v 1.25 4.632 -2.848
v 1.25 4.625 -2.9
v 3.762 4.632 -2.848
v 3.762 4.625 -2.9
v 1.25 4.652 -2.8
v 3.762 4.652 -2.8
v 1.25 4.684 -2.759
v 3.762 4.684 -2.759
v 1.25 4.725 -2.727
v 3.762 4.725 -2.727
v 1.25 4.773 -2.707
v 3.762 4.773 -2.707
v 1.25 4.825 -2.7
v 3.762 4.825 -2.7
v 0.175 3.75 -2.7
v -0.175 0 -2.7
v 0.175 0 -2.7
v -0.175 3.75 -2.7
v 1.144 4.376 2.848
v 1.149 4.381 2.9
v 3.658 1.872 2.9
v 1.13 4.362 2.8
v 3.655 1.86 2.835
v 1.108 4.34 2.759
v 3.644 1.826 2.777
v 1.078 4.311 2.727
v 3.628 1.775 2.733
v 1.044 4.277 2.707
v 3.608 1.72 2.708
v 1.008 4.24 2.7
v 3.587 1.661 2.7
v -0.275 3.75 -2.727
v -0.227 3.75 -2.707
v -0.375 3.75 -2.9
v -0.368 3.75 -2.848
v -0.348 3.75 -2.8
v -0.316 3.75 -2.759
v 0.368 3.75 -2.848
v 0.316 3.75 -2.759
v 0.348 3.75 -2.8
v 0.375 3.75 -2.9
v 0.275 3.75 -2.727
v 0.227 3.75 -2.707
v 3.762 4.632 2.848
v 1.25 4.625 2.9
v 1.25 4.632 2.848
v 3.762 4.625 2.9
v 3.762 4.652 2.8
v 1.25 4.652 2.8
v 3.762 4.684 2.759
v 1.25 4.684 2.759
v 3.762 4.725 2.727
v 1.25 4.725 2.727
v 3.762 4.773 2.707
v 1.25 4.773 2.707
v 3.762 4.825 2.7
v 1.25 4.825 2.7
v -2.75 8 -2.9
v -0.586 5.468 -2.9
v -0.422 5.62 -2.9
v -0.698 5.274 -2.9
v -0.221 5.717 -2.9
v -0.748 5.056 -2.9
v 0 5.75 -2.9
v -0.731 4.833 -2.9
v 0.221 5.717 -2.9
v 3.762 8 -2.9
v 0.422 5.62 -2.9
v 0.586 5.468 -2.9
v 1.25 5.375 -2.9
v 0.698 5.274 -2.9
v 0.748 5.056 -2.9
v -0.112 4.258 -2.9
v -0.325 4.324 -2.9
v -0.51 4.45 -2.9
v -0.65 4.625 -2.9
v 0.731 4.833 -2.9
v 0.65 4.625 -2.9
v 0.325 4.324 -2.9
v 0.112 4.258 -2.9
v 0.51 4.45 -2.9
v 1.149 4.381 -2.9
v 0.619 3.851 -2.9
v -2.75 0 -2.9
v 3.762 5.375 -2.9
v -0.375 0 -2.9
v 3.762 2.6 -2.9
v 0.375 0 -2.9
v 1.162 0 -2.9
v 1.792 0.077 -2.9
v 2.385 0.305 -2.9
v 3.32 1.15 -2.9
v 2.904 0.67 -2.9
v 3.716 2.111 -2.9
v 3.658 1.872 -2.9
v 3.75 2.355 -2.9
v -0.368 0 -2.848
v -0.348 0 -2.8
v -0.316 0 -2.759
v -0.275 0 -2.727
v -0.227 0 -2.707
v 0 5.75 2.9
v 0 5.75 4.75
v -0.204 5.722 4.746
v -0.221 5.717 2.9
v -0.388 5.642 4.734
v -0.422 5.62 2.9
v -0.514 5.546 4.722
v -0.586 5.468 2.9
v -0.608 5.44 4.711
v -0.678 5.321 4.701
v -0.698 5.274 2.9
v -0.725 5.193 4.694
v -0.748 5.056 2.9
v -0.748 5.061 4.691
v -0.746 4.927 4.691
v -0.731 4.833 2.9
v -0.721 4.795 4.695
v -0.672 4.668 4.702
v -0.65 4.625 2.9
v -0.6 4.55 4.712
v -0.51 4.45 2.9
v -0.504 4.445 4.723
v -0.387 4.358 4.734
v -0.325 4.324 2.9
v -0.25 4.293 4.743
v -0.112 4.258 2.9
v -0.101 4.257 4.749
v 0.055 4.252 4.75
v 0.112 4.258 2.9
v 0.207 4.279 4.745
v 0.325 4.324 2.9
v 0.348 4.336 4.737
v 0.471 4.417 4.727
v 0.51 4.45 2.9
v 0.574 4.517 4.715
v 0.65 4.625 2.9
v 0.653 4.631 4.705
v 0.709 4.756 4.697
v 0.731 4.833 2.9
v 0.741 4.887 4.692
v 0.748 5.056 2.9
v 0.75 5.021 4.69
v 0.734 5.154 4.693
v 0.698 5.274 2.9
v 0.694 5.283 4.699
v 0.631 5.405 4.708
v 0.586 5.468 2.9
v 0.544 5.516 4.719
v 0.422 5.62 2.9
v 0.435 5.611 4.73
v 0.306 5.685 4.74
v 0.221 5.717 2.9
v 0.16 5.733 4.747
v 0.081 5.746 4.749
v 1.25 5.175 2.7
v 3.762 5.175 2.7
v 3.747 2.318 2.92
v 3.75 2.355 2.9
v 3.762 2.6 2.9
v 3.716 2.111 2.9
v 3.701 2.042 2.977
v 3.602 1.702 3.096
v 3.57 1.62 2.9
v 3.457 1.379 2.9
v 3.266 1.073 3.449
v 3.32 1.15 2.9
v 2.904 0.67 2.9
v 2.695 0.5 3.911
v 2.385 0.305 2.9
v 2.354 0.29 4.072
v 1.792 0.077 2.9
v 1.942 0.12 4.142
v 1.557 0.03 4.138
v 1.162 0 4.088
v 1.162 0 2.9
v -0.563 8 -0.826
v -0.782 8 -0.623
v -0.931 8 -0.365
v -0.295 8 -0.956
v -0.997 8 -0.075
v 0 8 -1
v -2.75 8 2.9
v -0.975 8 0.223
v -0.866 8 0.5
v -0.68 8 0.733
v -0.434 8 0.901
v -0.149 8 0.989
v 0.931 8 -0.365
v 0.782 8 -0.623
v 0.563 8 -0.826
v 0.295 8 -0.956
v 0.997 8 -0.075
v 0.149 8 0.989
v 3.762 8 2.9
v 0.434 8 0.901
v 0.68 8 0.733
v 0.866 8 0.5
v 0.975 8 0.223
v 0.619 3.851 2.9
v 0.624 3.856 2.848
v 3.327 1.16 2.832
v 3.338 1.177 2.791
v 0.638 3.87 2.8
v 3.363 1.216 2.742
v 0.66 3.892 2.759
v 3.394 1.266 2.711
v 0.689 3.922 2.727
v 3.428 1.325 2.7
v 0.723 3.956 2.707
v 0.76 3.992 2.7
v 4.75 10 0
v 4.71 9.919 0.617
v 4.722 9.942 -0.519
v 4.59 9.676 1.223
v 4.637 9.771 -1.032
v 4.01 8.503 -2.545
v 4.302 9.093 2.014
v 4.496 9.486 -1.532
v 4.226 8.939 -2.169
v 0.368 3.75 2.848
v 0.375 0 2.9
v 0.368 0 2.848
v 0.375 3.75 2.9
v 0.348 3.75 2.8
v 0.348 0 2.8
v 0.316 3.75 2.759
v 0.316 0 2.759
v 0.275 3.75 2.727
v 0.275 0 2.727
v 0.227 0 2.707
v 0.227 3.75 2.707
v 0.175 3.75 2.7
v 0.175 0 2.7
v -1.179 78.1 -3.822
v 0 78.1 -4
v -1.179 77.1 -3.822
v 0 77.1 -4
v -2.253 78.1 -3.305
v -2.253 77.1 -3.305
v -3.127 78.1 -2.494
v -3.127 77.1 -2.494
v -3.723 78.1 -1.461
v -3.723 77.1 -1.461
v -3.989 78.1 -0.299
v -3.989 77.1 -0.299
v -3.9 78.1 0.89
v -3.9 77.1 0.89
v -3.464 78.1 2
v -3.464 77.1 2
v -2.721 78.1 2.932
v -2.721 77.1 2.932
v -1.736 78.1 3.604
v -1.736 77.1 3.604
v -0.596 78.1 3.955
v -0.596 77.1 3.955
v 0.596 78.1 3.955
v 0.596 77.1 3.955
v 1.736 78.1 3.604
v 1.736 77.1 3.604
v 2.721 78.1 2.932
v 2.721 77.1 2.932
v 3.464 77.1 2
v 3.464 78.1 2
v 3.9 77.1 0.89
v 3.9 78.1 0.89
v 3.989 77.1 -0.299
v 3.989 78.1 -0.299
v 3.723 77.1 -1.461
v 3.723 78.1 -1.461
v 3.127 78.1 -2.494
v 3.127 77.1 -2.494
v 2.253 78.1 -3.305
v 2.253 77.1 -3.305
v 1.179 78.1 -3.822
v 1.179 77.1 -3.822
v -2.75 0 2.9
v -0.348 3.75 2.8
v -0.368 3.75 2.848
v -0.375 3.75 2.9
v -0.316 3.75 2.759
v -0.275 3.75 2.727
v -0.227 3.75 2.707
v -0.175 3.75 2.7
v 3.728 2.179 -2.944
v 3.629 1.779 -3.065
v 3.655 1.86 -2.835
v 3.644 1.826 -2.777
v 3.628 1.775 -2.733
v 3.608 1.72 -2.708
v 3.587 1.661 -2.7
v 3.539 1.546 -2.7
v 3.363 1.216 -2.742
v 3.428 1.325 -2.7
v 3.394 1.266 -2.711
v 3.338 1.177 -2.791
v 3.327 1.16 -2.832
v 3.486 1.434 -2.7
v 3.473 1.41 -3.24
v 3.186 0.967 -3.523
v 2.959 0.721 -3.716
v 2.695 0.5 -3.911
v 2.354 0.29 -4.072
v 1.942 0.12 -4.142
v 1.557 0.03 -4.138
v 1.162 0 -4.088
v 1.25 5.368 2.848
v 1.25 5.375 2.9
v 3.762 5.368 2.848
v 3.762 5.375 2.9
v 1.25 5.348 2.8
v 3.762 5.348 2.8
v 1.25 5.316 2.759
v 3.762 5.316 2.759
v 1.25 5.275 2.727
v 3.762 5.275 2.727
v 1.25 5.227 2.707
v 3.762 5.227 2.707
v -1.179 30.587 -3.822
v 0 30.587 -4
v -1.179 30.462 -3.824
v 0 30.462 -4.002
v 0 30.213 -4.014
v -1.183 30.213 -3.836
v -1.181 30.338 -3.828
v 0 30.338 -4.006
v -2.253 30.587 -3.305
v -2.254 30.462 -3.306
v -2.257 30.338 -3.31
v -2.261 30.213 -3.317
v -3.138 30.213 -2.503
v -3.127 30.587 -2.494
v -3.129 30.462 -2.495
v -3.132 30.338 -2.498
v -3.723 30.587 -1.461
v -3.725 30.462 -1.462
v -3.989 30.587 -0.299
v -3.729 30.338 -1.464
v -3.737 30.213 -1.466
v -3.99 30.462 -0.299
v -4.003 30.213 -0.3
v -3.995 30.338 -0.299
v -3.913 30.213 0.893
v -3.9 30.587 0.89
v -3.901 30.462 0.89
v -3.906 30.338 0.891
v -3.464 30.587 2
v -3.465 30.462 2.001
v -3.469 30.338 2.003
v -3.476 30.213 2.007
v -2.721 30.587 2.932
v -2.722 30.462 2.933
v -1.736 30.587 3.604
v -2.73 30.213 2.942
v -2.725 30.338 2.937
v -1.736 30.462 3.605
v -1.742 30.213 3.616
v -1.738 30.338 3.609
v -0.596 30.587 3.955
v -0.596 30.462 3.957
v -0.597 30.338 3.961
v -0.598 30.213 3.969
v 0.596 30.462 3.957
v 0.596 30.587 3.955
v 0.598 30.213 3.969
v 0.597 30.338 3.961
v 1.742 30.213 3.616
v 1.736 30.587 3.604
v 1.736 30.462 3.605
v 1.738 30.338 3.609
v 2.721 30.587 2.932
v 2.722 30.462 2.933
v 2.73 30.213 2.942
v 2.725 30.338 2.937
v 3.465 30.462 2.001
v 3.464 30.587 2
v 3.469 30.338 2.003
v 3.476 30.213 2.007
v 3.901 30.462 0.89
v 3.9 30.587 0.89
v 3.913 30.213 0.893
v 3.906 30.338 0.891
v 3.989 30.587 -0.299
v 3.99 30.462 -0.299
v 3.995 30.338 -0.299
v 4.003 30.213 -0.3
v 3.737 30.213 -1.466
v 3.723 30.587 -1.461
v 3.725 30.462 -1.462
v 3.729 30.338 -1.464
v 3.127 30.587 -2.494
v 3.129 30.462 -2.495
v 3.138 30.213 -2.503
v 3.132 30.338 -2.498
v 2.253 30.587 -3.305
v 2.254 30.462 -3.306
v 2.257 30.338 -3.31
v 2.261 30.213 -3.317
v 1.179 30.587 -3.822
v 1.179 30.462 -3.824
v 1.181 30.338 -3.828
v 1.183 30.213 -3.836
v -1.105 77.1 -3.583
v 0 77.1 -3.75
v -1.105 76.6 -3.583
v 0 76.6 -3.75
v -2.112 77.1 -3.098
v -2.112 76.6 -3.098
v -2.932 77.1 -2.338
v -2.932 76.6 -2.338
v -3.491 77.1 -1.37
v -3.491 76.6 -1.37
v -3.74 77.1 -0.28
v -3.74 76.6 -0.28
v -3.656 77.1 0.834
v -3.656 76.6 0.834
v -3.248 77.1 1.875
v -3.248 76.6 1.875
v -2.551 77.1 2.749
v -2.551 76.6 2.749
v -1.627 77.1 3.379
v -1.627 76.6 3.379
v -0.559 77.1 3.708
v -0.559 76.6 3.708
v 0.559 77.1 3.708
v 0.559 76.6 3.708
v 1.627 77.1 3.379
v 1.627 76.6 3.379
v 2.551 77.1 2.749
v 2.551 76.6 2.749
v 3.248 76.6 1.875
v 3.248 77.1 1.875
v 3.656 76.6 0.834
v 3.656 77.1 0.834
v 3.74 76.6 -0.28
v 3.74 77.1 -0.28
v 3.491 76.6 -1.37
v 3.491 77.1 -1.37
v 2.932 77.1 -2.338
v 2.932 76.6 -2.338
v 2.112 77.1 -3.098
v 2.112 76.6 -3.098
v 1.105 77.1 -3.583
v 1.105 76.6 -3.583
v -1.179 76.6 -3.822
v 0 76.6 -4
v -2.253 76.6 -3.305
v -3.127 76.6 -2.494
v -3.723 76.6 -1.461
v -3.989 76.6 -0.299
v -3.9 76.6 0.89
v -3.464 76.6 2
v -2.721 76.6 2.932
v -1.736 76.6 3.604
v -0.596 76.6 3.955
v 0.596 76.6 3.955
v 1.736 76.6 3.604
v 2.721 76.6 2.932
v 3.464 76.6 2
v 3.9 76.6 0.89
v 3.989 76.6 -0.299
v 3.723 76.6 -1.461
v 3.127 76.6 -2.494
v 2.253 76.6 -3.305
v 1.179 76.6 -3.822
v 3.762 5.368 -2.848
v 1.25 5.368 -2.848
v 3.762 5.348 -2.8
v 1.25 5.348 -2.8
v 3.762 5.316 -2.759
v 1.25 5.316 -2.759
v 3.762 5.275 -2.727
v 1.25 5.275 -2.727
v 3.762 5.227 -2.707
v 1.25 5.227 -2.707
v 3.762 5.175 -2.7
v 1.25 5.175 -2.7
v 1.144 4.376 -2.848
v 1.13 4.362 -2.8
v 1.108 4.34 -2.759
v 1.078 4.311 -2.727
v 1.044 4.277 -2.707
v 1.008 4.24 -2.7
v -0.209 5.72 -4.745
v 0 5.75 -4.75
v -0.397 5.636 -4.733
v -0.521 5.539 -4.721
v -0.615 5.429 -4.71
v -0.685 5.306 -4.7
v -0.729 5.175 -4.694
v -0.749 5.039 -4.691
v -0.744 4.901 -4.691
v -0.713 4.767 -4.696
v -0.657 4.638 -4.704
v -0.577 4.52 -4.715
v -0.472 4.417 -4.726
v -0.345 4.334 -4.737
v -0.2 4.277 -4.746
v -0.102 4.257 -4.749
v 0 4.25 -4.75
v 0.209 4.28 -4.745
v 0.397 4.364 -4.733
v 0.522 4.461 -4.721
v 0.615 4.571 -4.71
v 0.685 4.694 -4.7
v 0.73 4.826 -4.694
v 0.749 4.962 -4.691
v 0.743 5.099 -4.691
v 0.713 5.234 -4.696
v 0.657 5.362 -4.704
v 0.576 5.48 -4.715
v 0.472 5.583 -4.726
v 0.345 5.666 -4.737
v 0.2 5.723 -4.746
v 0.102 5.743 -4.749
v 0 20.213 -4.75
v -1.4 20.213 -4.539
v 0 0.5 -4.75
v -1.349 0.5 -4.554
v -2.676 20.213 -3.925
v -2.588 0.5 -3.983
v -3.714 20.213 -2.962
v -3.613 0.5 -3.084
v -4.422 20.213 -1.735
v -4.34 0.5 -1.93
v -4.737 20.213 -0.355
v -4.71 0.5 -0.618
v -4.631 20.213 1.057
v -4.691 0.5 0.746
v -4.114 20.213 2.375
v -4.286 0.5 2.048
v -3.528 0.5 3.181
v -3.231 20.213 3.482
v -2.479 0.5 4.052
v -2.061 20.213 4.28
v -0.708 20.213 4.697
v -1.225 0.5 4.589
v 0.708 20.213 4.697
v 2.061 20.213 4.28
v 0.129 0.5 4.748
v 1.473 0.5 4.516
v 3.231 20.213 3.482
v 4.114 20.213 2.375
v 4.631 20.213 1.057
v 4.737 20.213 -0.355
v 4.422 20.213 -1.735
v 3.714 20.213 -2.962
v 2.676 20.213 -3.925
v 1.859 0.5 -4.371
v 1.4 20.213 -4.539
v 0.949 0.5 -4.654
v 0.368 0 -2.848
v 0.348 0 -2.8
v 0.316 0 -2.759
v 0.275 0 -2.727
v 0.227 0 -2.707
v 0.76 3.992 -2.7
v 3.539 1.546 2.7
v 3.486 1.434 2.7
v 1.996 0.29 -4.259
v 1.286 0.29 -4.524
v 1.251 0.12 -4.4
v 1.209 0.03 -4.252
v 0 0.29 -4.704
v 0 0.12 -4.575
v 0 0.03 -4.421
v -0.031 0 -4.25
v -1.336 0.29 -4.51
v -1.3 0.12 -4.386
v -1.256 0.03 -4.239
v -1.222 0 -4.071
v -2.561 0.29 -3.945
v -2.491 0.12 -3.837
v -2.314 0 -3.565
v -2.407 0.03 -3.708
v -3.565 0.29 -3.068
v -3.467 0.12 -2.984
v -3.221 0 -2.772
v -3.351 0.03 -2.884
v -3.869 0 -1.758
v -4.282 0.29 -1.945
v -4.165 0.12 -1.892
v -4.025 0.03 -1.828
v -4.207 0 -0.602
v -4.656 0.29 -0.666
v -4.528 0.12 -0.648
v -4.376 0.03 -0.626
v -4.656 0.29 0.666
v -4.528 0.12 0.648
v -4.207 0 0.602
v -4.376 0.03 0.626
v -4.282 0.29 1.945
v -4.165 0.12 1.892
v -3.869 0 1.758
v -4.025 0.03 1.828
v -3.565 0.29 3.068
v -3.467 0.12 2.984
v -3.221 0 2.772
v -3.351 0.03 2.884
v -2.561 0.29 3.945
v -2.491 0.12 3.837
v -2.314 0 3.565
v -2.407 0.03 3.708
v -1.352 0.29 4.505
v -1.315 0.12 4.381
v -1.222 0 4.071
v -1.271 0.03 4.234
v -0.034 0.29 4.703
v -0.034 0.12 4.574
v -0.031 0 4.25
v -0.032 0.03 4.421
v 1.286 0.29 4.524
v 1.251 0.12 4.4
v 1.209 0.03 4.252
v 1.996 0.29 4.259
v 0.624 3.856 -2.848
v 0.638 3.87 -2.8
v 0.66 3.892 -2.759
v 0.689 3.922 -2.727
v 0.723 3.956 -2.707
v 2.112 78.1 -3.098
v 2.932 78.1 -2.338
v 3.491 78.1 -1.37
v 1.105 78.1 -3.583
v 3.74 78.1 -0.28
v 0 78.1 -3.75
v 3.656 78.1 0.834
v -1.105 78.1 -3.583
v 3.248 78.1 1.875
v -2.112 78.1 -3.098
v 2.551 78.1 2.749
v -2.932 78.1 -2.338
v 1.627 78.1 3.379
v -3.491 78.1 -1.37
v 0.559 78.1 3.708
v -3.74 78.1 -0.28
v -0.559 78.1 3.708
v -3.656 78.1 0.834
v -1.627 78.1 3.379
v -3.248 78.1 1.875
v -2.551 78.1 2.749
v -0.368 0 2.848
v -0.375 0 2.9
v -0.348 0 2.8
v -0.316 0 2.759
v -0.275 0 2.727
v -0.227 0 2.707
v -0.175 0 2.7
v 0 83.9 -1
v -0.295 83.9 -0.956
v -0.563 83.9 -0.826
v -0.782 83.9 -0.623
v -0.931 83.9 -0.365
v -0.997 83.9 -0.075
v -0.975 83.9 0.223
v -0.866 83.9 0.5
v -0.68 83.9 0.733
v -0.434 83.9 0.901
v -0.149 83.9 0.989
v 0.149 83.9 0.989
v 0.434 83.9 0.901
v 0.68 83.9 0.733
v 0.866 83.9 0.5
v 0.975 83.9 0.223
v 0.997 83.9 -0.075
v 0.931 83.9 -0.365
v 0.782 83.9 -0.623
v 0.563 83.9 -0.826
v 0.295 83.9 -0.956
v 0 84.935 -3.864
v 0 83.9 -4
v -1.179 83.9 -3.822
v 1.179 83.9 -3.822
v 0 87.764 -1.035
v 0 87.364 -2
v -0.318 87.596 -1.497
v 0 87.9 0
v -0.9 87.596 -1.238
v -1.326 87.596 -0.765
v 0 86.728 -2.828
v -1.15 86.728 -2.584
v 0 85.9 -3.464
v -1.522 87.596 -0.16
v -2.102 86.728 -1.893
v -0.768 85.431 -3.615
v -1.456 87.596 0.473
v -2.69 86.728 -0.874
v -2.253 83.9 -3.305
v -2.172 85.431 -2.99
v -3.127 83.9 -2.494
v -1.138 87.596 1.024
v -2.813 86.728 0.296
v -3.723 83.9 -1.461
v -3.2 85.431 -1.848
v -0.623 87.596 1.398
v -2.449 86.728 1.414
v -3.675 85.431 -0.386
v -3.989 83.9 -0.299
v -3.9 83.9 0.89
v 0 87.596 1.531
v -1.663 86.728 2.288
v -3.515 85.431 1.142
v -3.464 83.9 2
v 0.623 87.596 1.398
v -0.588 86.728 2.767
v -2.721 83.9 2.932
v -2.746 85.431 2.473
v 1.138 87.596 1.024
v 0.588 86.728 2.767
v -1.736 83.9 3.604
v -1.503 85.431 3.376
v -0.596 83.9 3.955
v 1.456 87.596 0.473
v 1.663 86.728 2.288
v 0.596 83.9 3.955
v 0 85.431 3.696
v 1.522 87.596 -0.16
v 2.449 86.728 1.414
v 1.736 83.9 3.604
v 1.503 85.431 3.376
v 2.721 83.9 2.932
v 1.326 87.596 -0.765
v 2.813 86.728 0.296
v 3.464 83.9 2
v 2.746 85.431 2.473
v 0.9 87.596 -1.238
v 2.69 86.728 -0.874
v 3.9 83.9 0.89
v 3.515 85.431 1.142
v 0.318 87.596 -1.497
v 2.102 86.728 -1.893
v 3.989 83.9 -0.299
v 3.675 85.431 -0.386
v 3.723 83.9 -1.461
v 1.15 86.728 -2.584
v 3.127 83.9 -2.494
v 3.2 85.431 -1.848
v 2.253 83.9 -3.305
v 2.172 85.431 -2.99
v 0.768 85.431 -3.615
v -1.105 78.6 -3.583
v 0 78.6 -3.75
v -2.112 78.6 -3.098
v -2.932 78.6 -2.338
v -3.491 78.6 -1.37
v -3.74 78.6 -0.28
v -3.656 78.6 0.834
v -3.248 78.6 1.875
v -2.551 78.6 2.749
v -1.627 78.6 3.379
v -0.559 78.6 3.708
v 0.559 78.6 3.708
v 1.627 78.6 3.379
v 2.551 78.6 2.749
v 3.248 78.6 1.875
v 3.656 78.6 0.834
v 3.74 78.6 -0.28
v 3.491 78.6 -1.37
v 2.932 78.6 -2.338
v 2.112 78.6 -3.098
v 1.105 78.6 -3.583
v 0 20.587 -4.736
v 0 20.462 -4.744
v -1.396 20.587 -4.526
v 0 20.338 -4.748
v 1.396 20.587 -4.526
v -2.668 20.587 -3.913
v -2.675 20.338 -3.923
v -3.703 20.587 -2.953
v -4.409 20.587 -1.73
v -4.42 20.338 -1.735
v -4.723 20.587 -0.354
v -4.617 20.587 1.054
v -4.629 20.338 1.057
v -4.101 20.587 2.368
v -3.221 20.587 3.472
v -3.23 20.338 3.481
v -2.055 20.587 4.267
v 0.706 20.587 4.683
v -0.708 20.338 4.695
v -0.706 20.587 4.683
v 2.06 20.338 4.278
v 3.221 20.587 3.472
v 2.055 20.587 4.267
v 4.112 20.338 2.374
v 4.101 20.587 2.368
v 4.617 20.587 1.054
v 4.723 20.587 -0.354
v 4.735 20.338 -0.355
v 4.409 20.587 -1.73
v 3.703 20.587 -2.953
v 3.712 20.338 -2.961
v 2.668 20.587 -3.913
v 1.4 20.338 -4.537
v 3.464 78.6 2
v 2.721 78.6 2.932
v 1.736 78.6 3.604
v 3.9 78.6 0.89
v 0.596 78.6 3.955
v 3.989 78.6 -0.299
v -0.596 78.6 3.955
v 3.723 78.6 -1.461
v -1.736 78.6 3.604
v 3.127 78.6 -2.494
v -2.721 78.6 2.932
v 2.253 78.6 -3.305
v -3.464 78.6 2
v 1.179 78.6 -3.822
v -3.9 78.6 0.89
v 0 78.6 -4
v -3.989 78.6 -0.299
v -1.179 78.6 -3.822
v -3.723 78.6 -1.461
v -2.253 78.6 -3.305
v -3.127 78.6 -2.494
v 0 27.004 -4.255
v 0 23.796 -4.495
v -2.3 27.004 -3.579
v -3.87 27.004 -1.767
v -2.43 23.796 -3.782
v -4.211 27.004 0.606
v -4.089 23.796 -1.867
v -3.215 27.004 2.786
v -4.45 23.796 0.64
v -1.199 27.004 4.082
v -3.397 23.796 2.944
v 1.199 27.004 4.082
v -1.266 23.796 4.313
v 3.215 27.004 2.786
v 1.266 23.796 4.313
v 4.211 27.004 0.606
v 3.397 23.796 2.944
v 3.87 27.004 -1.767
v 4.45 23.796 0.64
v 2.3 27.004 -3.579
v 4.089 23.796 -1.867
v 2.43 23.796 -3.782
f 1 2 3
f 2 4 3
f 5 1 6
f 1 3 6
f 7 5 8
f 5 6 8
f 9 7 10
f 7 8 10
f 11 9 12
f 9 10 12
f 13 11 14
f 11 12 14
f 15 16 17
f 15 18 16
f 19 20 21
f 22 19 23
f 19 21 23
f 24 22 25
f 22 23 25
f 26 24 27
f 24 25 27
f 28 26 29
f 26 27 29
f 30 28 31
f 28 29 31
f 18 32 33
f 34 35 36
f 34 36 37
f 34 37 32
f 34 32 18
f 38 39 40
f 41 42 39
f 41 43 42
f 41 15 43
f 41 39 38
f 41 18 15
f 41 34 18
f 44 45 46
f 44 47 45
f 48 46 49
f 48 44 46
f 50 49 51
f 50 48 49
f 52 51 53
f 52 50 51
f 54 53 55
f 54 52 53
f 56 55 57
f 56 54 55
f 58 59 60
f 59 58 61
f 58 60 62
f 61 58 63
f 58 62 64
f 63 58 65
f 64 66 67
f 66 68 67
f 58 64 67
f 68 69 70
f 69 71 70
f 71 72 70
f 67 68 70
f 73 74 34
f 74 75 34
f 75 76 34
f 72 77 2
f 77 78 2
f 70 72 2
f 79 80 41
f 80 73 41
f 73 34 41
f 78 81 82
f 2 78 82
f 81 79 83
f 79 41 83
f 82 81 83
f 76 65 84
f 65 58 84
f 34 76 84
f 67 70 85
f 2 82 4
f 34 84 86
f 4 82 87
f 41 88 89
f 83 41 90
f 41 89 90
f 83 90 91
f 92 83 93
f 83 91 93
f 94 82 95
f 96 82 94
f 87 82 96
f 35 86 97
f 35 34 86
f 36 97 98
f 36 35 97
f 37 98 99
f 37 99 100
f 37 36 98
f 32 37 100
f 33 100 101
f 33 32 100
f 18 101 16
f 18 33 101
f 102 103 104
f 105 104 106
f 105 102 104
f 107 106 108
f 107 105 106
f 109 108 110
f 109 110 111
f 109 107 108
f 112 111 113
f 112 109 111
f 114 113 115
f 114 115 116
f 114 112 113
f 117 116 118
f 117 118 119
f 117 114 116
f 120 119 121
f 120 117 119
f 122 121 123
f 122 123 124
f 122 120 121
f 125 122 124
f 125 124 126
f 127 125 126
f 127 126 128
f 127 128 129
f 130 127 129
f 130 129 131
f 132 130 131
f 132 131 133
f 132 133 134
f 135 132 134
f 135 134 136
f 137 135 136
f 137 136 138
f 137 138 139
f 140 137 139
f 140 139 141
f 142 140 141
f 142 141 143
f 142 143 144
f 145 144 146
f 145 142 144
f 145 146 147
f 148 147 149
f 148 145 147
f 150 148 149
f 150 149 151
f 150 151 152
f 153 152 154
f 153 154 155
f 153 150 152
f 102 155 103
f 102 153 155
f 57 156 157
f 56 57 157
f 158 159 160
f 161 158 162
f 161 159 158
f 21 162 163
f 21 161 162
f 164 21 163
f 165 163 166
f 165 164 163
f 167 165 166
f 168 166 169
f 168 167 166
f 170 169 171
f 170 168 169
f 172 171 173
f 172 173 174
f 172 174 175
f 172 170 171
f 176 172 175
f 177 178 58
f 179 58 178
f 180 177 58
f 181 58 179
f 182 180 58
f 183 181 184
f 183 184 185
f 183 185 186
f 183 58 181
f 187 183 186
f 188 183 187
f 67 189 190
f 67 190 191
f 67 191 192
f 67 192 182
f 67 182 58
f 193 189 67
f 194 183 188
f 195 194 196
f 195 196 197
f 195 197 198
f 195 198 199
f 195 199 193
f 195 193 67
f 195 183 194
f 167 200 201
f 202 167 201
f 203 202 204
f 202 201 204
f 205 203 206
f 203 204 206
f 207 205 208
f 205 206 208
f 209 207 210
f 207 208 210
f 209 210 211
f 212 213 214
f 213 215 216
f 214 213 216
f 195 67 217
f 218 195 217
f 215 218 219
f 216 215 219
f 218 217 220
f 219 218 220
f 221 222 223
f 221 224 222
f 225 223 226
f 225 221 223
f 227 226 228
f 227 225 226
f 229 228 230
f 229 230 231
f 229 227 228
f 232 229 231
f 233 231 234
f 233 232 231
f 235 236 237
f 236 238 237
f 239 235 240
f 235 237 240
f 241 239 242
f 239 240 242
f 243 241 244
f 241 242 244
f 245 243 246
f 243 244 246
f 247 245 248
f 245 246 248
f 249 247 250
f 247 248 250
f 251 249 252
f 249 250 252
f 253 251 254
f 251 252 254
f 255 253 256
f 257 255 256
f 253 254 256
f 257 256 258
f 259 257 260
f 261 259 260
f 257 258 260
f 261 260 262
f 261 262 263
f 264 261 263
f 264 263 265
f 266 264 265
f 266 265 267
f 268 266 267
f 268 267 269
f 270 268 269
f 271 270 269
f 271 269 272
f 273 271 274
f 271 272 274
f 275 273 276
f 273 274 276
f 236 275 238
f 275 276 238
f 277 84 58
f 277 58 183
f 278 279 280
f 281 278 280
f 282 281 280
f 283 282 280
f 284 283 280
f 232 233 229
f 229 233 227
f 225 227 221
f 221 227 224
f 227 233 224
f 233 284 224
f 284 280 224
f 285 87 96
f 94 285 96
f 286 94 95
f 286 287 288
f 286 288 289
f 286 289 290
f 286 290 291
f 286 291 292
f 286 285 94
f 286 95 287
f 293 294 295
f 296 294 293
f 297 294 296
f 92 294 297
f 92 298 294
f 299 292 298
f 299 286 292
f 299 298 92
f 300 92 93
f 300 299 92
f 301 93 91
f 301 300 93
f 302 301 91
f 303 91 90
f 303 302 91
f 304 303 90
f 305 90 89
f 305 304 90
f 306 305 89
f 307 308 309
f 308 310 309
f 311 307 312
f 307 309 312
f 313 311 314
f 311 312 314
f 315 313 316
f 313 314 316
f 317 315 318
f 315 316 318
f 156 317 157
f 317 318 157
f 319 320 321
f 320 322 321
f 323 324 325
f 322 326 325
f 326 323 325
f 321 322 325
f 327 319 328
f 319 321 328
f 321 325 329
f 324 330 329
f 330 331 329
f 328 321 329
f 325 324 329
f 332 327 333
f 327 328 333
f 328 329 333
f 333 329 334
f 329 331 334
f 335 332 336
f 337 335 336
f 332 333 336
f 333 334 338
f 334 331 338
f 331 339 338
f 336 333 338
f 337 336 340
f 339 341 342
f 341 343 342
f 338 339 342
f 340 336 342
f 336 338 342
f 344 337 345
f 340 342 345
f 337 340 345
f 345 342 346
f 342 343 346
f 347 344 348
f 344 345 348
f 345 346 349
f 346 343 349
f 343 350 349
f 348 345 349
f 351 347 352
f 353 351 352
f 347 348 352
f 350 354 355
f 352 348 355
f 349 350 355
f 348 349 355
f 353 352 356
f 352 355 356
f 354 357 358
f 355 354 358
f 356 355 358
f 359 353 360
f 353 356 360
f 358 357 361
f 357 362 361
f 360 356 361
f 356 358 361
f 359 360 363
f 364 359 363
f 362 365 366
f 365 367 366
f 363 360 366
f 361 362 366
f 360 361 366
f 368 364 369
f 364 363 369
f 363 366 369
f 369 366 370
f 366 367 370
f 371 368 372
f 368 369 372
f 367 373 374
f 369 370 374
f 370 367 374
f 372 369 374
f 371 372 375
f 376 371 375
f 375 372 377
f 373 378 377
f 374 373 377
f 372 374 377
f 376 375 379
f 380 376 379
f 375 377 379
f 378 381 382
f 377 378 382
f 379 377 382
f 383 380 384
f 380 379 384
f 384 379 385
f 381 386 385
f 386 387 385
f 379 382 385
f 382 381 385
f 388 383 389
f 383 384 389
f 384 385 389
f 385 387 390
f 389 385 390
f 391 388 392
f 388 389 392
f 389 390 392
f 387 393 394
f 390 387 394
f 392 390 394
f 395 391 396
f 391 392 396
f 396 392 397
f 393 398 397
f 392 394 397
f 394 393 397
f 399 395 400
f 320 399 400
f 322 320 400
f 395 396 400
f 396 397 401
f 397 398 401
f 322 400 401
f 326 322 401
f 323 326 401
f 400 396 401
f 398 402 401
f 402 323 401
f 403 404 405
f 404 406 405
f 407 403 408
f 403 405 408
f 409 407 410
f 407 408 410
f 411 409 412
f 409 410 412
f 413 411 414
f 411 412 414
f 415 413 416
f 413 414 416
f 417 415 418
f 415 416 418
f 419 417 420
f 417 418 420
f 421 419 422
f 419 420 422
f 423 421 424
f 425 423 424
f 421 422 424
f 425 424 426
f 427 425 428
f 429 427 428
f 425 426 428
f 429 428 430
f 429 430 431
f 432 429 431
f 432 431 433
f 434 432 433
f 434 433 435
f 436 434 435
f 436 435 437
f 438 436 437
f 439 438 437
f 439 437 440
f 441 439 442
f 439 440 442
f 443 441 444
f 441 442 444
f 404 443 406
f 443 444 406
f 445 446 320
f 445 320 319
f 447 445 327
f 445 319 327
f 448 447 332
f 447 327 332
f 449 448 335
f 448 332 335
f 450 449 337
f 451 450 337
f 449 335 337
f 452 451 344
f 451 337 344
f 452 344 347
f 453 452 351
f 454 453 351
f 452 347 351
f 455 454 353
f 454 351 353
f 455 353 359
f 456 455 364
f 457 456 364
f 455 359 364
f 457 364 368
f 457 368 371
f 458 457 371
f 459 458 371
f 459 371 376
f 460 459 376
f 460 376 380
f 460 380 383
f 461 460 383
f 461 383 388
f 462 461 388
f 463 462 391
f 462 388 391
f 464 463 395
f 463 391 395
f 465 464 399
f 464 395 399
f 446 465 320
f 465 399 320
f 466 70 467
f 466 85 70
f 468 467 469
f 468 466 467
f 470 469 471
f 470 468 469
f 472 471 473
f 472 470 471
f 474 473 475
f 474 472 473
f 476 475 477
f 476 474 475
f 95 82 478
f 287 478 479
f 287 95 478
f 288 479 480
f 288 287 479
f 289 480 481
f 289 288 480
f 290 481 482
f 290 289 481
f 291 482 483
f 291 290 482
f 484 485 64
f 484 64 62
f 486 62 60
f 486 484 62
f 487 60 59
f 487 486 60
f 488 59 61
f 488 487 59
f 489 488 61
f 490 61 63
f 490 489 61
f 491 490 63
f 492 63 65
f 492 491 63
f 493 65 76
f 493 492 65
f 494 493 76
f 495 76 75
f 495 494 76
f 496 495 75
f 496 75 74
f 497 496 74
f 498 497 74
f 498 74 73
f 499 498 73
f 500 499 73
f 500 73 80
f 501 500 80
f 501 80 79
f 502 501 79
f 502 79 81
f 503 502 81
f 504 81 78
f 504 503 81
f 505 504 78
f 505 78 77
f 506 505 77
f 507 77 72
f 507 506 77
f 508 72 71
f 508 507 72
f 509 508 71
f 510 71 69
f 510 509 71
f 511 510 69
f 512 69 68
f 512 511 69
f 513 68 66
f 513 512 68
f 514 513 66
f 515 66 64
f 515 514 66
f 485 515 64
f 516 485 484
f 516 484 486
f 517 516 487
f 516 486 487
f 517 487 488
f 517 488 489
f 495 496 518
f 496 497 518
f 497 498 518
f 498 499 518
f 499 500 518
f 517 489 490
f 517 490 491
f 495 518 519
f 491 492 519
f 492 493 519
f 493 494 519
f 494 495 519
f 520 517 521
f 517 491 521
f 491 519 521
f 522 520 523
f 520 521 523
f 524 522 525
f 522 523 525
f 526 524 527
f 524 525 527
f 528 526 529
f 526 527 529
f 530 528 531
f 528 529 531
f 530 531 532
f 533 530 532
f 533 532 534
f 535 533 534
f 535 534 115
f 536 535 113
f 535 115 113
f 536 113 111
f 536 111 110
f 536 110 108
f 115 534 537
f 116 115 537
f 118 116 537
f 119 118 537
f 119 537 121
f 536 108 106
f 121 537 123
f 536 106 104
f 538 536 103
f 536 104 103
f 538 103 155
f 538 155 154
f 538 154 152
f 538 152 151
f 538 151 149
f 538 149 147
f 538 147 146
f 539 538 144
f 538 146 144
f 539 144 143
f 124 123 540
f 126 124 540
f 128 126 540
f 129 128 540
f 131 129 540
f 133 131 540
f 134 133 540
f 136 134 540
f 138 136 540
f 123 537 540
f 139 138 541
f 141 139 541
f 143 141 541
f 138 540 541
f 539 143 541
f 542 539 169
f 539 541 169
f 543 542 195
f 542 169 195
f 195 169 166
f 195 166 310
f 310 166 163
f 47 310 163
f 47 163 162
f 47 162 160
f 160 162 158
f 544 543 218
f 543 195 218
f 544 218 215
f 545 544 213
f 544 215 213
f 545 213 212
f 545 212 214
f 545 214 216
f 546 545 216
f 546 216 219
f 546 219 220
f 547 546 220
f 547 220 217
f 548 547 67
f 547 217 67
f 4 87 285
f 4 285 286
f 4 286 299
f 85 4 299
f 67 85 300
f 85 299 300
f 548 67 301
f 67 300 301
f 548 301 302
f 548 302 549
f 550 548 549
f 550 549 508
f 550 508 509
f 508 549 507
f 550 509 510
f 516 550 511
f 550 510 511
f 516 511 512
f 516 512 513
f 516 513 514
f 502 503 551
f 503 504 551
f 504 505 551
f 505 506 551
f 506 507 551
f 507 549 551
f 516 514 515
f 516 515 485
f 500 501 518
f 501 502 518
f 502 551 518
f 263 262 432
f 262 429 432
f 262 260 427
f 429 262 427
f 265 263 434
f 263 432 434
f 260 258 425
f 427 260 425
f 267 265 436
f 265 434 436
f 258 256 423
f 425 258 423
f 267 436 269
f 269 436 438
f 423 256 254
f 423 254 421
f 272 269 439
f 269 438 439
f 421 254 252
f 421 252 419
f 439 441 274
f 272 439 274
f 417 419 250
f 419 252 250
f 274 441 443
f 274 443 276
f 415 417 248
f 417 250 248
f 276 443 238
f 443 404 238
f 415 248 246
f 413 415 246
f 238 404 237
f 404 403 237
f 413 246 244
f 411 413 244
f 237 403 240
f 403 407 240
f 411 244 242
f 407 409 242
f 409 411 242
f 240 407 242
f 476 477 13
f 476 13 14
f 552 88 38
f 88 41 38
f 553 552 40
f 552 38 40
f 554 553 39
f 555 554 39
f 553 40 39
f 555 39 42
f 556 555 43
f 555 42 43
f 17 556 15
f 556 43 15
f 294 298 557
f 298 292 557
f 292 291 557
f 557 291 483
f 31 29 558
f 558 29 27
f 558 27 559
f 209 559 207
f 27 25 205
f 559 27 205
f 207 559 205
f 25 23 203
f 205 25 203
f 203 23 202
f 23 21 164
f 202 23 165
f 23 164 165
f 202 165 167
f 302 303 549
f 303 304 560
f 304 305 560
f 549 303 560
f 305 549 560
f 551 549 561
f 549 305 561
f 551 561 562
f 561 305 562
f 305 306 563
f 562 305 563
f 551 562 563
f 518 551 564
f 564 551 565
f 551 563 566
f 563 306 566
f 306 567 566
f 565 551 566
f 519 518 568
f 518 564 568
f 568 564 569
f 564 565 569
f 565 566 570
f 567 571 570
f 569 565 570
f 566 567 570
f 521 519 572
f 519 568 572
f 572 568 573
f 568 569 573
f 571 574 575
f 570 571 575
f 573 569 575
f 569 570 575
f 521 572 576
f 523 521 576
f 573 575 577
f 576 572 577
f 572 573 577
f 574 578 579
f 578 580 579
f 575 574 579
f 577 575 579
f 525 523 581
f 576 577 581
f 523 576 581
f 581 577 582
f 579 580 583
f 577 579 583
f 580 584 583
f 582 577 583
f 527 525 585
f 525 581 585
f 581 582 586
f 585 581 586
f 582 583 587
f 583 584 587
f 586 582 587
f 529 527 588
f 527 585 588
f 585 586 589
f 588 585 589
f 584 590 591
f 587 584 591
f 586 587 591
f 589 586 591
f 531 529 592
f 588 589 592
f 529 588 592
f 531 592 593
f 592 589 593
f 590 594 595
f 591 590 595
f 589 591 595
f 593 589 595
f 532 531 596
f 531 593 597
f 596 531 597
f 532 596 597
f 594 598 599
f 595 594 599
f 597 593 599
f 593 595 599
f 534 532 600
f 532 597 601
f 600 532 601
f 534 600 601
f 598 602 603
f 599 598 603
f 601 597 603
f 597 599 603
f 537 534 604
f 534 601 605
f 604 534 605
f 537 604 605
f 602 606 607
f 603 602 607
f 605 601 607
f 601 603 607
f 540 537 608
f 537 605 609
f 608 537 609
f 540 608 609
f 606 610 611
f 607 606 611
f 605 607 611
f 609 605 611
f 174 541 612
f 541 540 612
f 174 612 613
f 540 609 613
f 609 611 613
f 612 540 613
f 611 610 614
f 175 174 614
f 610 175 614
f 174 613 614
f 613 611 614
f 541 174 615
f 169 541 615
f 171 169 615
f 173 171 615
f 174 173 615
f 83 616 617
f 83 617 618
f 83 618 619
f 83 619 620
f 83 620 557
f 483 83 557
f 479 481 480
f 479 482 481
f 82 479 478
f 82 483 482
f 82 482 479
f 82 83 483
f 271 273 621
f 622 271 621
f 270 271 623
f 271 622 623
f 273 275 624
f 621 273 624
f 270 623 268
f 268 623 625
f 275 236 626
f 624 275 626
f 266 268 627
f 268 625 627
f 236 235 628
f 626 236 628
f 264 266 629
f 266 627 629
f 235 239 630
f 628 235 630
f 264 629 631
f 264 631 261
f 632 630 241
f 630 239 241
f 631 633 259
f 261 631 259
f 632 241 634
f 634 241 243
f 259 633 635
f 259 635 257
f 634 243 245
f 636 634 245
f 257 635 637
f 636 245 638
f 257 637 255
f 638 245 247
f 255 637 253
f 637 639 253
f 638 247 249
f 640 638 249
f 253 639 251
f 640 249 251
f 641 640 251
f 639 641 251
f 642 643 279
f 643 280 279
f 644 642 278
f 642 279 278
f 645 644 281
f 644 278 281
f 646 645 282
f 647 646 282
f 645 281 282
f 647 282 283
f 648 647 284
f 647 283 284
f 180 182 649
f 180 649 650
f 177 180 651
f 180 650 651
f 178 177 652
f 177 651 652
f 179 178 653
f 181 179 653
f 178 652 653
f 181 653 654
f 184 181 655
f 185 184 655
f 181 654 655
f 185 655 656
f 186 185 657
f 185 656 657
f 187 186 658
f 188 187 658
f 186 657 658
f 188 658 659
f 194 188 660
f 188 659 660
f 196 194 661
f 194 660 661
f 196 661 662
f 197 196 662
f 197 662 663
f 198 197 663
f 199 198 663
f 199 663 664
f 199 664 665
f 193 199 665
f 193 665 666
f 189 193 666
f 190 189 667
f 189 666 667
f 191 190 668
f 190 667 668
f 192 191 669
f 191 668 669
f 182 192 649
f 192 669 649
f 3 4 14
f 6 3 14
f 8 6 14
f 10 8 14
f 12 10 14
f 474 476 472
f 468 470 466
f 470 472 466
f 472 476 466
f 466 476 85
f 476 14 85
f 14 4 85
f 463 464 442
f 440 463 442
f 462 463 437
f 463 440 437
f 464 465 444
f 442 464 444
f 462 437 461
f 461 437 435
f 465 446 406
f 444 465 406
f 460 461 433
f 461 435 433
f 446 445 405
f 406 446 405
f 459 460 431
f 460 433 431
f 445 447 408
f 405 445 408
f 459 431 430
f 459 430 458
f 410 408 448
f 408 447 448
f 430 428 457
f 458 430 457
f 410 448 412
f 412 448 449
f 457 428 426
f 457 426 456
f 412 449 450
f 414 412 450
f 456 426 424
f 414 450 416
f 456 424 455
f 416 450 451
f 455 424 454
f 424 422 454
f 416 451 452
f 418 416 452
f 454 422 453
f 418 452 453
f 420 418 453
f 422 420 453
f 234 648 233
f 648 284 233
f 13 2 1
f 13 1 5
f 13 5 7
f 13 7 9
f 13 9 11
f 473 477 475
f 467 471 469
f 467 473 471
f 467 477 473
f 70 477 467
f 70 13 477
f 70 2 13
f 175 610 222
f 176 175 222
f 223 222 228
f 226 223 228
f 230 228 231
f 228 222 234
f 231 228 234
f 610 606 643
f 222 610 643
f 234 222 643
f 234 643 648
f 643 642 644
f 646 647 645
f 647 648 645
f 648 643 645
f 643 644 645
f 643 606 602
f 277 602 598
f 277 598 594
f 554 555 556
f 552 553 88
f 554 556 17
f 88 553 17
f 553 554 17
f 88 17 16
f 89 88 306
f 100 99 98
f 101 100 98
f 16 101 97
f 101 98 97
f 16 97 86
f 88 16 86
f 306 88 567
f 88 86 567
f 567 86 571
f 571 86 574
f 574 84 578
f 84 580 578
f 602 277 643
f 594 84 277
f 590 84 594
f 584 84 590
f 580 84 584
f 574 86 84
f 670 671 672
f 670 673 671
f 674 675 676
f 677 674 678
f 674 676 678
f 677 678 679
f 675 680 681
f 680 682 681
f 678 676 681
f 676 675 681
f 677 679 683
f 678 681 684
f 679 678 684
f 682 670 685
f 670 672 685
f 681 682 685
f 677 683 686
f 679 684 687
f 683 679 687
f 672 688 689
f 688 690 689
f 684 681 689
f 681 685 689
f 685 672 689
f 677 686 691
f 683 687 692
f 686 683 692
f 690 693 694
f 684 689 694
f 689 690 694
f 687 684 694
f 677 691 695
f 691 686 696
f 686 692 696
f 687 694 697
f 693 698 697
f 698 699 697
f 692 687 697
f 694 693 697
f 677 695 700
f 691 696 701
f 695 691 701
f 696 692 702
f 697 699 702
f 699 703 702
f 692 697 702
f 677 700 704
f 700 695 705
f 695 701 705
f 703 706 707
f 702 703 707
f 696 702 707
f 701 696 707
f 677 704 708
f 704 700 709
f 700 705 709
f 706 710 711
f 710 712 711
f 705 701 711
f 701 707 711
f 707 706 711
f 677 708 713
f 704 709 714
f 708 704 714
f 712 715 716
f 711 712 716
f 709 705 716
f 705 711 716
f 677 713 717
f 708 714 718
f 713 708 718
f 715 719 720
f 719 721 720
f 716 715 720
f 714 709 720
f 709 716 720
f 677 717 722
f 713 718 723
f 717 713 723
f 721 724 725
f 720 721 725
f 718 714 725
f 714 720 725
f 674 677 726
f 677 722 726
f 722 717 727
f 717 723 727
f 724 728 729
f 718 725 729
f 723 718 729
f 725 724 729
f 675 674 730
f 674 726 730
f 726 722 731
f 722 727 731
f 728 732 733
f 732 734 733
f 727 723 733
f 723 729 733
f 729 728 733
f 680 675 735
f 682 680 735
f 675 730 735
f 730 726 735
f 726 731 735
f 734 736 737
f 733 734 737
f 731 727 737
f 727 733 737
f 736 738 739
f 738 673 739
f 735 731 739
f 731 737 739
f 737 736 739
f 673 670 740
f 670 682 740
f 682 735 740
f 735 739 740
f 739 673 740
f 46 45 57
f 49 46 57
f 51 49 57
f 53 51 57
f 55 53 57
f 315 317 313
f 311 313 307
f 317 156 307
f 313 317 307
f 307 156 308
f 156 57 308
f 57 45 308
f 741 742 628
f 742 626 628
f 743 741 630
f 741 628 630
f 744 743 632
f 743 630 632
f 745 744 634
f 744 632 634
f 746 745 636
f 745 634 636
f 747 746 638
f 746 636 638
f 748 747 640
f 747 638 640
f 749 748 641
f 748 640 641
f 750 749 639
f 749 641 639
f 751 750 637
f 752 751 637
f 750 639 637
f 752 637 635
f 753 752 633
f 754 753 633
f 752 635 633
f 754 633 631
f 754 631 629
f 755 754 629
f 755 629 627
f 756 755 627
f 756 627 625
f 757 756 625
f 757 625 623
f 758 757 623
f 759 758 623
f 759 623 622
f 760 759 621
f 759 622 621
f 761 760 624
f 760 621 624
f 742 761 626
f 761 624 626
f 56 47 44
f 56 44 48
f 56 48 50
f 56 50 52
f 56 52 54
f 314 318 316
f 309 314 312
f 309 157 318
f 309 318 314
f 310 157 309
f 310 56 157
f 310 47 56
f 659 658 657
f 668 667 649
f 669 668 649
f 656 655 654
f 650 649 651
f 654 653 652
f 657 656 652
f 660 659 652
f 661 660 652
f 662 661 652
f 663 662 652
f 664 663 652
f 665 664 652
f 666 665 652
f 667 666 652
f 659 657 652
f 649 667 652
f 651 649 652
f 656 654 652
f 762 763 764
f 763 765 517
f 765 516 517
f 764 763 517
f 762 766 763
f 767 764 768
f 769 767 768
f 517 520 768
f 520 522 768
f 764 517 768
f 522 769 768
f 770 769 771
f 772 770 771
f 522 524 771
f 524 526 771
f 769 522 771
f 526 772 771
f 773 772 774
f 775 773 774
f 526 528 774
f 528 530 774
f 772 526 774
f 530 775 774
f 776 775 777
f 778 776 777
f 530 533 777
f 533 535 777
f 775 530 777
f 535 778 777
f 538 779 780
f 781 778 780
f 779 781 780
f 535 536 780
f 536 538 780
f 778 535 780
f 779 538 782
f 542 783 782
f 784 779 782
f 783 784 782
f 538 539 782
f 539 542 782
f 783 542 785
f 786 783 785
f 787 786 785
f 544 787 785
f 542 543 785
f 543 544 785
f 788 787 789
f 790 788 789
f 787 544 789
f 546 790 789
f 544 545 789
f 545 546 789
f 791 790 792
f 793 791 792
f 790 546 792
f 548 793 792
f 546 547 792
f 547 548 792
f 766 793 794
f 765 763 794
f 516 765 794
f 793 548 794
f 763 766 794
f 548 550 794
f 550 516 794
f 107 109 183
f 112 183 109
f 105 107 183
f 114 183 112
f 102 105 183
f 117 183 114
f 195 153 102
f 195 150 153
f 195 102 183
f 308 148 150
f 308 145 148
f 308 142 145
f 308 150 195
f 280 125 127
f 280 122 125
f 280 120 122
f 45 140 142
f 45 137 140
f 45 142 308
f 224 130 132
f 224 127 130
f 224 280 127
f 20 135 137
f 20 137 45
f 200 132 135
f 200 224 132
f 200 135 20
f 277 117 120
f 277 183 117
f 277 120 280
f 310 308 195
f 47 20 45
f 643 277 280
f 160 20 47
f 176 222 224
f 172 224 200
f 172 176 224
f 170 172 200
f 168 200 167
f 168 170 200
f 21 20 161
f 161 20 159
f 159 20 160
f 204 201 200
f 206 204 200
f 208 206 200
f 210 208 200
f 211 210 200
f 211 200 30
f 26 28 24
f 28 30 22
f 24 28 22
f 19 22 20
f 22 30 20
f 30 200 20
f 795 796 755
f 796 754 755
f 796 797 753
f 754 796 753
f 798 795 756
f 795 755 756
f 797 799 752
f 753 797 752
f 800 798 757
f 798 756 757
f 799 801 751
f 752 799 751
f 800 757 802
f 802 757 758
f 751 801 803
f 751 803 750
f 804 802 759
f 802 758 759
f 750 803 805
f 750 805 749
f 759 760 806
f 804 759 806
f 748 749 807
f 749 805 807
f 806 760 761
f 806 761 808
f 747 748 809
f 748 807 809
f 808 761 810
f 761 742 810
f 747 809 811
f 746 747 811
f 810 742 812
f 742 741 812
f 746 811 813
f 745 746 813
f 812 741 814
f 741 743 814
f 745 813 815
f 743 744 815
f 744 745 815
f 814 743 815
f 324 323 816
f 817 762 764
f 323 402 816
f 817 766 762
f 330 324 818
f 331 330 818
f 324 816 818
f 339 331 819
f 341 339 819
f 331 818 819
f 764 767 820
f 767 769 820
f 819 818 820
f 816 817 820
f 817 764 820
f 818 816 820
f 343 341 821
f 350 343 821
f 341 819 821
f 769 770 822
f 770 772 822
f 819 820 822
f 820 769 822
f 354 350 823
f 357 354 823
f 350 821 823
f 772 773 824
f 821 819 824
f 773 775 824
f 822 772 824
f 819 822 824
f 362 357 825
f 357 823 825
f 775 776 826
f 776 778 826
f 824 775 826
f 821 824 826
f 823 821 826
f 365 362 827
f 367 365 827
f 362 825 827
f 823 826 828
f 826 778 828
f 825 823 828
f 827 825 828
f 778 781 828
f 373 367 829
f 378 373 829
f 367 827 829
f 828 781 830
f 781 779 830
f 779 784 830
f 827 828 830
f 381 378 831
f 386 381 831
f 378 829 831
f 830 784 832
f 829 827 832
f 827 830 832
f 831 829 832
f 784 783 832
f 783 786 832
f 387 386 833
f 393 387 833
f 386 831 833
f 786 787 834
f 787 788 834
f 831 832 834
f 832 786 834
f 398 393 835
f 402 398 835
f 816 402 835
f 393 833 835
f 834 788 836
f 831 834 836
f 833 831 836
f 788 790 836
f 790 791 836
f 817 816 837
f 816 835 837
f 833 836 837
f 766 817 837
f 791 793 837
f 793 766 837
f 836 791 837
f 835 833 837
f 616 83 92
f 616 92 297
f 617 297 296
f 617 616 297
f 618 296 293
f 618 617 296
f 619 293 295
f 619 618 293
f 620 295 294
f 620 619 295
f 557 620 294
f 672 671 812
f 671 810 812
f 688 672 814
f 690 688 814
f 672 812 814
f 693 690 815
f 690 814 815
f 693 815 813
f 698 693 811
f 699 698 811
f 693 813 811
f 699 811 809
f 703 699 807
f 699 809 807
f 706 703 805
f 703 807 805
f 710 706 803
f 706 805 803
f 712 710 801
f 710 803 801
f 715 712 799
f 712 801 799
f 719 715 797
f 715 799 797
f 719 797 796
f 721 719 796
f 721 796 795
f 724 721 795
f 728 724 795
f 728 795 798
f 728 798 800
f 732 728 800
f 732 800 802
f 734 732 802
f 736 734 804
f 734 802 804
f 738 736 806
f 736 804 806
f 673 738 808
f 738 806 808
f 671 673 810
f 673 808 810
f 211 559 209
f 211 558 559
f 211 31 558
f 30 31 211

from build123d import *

# Parameters (mm, degrees)
ESQUISSE3_W                  = 7.5
ESQUISSE3_H                  = 5.8
ENL_V_MAT_EXTRU_1_DEPTH      = 8
CONG_1_R                     = 0.5
ENL_V_MAT_EXTRU_2_DEPTH      = 89.156310052
ENL_V_MAT_EXTRU_2_DEPTH_BACK = 89.156310052
ESQUISSE4_R                  = 0.75
ESQUISSE5_W                  = 0.75
ESQUISSE5_H                  = 3.75
ESQUISSE5_W_2                = 2.511980861
ESQUISSE5_H_2                = 0.75
BOSS_EXTRU_1_DEPTH           = 0.2
CONG_2_R                     = 0.2
CONG_2_OF_SYM_TRIE1_R        = 0.2
ENL_V_MAT_EXTRU_3_DEPTH      = 89.360030571


with BuildPart() as part:
    # Esquisse2 → Révolution1 (revolve)
    with BuildSketch(Plane.XY, mode=Mode.PRIVATE) as r_volution1_sk:
        with BuildLine():
            Line((4.014003451, 30.213287326), (4.735996549, 20.586712674))
            ThreePointArc((4.735996549, 20.586712674), (4.746497911, 20.399868856), (4.75, 20.212762933))
            Line((4.75, 20.212762933), (4.75, 0))
            Line((4.75, 0), (1, 0))
            Line((1, 0), (1, 83.9))
            Line((1, 83.9), (0, 83.9))
            Line((0, 83.9), (0, 87.9))
            ThreePointArc((0, 87.9), (2.828427125, 86.728427125), (4, 83.9))
            Line((4, 83.9), (4, 78.6))
            Line((4, 78.6), (3.75, 78.6))
            Line((3.75, 78.6), (3.75, 78.1))
            Line((3.75, 78.1), (4, 78.1))
            Line((4, 78.1), (4, 77.1))
            Line((4, 77.1), (3.75, 77.1))
            Line((3.75, 77.1), (3.75, 76.6))
            Line((3.75, 76.6), (4, 76.6))
            Line((4, 76.6), (4, 30.587237067))
            ThreePointArc((4, 30.587237067), (4.003502089, 30.400131144), (4.014003451, 30.213287326))
        make_face()
    revolve(r_volution1_sk.sketch.rotate(Axis((0, 0, 0), (0, 1, 0)), 90), axis=Axis((0, 0, 0), (0, 1, 0)))

    # Esquisse3 → Enlèv. mat.-Extru.1 (cut)
    with BuildSketch(Plane.XZ):
        with Locations((1, 0)):
            Rectangle(ESQUISSE3_W, ESQUISSE3_H)
    extrude(amount=-ENL_V_MAT_EXTRU_1_DEPTH, mode=Mode.SUBTRACT)

    # Congé1
    cong_1_edges = [part.edges().sort_by_distance(p)[0] for p in [
        (-4.262481672, 0, 2.096127382),
    ]]
    fillet(cong_1_edges, radius=CONG_1_R)

    # Esquisse4 → Enlèv. mat.-Extru.2 (cut, two sides: drawn at the far end of the back side and taken through both)
    with BuildSketch(Plane.XY.offset(-ENL_V_MAT_EXTRU_2_DEPTH_BACK)):
        with Locations(Location((0, 5, 0), (0, 0, 90))):
            Circle(ESQUISSE4_R)
        with BuildLine():
            Line((1.161980861, 0), (3.761980861, 0))
            Line((3.761980861, 0), (3.761980861, 2.6))
            ThreePointArc((3.761980861, 2.6), (3.000458492, 0.761522369), (1.161980861, 0))
        make_face()
        Polygon((3.761980861, 8), (4.75, 10), (4.75, 8), align=None)
    extrude(amount=ENL_V_MAT_EXTRU_2_DEPTH + ENL_V_MAT_EXTRU_2_DEPTH_BACK, mode=Mode.SUBTRACT)

    # Esquisse5 → Boss.-Extru.1 (add)
    with BuildSketch(Plane.XY.offset(-2.9)):
        with Locations((0, 1.875)):
            Rectangle(ESQUISSE5_W, ESQUISSE5_H)
        Polygon((0.618718434, 3.850951481), (1.149048519, 4.381281566), (4.027145904, 1.503184182), (3.496815818, 0.972854096), align=None)
        with Locations((2.50599043, 5)):
            Rectangle(ESQUISSE5_W_2, ESQUISSE5_H_2)
    boss_extru_1 = extrude(amount=BOSS_EXTRU_1_DEPTH)

    # Congé2
    cong_2_edges = [part.edges().sort_by_distance(p)[0] for p in [
        (2.505990431, 5.375, -2.7),
        (2.505990431, 4.625, -2.7),
        (2.588097212, 2.942232874, -2.7),
        (2.057767126, 2.411902788, -2.7),
        (-0.375, 1.875, -2.7),
        (0.375, 1.875, -2.7),
    ]]
    fillet(cong_2_edges, radius=CONG_2_R - 0.0001)  # a hair under: the kernel refuses the full size

    # Symétrie1: Boss.-Extru.1 across plane
    add(boss_extru_1.mirror(Plane.XY))

    # Congé2 of Symétrie1
    cong_2_of_sym_trie1_edges = [part.edges().sort_by_distance(p)[0] for p in [
        (2.505990431, 5.375, 2.7),
        (2.505990431, 4.625, 2.7),
        (2.588097212, 2.942232874, 2.7),
        (2.057767126, 2.411902788, 2.7),
        (-0.375, 1.875, 2.7),
        (0.375, 1.875, 2.7),
    ]]
    fillet(cong_2_of_sym_trie1_edges, radius=CONG_2_OF_SYM_TRIE1_R - 0.0001)  # a hair under: the kernel refuses the full size

    # Esquisse6 → Enlèv. mat.-Extru.3 (cut, through all)
    with BuildSketch(Plane.XY.offset(2.9)):
        with BuildLine():
            Line((4.027145904, 1.503184182), (3.658059706, 1.87227038))
            ThreePointArc((3.658059706, 1.87227038), (3.516870908, 1.49795968), (3.319930166, 1.149739748))
            Line((3.319930166, 1.149739748), (3.496815818, 0.972854096))
            Line((3.496815818, 0.972854096), (4.027145904, 1.503184182))
        make_face()
    extrude(amount=-ENL_V_MAT_EXTRU_3_DEPTH, mode=Mode.SUBTRACT)


solid = part.part
